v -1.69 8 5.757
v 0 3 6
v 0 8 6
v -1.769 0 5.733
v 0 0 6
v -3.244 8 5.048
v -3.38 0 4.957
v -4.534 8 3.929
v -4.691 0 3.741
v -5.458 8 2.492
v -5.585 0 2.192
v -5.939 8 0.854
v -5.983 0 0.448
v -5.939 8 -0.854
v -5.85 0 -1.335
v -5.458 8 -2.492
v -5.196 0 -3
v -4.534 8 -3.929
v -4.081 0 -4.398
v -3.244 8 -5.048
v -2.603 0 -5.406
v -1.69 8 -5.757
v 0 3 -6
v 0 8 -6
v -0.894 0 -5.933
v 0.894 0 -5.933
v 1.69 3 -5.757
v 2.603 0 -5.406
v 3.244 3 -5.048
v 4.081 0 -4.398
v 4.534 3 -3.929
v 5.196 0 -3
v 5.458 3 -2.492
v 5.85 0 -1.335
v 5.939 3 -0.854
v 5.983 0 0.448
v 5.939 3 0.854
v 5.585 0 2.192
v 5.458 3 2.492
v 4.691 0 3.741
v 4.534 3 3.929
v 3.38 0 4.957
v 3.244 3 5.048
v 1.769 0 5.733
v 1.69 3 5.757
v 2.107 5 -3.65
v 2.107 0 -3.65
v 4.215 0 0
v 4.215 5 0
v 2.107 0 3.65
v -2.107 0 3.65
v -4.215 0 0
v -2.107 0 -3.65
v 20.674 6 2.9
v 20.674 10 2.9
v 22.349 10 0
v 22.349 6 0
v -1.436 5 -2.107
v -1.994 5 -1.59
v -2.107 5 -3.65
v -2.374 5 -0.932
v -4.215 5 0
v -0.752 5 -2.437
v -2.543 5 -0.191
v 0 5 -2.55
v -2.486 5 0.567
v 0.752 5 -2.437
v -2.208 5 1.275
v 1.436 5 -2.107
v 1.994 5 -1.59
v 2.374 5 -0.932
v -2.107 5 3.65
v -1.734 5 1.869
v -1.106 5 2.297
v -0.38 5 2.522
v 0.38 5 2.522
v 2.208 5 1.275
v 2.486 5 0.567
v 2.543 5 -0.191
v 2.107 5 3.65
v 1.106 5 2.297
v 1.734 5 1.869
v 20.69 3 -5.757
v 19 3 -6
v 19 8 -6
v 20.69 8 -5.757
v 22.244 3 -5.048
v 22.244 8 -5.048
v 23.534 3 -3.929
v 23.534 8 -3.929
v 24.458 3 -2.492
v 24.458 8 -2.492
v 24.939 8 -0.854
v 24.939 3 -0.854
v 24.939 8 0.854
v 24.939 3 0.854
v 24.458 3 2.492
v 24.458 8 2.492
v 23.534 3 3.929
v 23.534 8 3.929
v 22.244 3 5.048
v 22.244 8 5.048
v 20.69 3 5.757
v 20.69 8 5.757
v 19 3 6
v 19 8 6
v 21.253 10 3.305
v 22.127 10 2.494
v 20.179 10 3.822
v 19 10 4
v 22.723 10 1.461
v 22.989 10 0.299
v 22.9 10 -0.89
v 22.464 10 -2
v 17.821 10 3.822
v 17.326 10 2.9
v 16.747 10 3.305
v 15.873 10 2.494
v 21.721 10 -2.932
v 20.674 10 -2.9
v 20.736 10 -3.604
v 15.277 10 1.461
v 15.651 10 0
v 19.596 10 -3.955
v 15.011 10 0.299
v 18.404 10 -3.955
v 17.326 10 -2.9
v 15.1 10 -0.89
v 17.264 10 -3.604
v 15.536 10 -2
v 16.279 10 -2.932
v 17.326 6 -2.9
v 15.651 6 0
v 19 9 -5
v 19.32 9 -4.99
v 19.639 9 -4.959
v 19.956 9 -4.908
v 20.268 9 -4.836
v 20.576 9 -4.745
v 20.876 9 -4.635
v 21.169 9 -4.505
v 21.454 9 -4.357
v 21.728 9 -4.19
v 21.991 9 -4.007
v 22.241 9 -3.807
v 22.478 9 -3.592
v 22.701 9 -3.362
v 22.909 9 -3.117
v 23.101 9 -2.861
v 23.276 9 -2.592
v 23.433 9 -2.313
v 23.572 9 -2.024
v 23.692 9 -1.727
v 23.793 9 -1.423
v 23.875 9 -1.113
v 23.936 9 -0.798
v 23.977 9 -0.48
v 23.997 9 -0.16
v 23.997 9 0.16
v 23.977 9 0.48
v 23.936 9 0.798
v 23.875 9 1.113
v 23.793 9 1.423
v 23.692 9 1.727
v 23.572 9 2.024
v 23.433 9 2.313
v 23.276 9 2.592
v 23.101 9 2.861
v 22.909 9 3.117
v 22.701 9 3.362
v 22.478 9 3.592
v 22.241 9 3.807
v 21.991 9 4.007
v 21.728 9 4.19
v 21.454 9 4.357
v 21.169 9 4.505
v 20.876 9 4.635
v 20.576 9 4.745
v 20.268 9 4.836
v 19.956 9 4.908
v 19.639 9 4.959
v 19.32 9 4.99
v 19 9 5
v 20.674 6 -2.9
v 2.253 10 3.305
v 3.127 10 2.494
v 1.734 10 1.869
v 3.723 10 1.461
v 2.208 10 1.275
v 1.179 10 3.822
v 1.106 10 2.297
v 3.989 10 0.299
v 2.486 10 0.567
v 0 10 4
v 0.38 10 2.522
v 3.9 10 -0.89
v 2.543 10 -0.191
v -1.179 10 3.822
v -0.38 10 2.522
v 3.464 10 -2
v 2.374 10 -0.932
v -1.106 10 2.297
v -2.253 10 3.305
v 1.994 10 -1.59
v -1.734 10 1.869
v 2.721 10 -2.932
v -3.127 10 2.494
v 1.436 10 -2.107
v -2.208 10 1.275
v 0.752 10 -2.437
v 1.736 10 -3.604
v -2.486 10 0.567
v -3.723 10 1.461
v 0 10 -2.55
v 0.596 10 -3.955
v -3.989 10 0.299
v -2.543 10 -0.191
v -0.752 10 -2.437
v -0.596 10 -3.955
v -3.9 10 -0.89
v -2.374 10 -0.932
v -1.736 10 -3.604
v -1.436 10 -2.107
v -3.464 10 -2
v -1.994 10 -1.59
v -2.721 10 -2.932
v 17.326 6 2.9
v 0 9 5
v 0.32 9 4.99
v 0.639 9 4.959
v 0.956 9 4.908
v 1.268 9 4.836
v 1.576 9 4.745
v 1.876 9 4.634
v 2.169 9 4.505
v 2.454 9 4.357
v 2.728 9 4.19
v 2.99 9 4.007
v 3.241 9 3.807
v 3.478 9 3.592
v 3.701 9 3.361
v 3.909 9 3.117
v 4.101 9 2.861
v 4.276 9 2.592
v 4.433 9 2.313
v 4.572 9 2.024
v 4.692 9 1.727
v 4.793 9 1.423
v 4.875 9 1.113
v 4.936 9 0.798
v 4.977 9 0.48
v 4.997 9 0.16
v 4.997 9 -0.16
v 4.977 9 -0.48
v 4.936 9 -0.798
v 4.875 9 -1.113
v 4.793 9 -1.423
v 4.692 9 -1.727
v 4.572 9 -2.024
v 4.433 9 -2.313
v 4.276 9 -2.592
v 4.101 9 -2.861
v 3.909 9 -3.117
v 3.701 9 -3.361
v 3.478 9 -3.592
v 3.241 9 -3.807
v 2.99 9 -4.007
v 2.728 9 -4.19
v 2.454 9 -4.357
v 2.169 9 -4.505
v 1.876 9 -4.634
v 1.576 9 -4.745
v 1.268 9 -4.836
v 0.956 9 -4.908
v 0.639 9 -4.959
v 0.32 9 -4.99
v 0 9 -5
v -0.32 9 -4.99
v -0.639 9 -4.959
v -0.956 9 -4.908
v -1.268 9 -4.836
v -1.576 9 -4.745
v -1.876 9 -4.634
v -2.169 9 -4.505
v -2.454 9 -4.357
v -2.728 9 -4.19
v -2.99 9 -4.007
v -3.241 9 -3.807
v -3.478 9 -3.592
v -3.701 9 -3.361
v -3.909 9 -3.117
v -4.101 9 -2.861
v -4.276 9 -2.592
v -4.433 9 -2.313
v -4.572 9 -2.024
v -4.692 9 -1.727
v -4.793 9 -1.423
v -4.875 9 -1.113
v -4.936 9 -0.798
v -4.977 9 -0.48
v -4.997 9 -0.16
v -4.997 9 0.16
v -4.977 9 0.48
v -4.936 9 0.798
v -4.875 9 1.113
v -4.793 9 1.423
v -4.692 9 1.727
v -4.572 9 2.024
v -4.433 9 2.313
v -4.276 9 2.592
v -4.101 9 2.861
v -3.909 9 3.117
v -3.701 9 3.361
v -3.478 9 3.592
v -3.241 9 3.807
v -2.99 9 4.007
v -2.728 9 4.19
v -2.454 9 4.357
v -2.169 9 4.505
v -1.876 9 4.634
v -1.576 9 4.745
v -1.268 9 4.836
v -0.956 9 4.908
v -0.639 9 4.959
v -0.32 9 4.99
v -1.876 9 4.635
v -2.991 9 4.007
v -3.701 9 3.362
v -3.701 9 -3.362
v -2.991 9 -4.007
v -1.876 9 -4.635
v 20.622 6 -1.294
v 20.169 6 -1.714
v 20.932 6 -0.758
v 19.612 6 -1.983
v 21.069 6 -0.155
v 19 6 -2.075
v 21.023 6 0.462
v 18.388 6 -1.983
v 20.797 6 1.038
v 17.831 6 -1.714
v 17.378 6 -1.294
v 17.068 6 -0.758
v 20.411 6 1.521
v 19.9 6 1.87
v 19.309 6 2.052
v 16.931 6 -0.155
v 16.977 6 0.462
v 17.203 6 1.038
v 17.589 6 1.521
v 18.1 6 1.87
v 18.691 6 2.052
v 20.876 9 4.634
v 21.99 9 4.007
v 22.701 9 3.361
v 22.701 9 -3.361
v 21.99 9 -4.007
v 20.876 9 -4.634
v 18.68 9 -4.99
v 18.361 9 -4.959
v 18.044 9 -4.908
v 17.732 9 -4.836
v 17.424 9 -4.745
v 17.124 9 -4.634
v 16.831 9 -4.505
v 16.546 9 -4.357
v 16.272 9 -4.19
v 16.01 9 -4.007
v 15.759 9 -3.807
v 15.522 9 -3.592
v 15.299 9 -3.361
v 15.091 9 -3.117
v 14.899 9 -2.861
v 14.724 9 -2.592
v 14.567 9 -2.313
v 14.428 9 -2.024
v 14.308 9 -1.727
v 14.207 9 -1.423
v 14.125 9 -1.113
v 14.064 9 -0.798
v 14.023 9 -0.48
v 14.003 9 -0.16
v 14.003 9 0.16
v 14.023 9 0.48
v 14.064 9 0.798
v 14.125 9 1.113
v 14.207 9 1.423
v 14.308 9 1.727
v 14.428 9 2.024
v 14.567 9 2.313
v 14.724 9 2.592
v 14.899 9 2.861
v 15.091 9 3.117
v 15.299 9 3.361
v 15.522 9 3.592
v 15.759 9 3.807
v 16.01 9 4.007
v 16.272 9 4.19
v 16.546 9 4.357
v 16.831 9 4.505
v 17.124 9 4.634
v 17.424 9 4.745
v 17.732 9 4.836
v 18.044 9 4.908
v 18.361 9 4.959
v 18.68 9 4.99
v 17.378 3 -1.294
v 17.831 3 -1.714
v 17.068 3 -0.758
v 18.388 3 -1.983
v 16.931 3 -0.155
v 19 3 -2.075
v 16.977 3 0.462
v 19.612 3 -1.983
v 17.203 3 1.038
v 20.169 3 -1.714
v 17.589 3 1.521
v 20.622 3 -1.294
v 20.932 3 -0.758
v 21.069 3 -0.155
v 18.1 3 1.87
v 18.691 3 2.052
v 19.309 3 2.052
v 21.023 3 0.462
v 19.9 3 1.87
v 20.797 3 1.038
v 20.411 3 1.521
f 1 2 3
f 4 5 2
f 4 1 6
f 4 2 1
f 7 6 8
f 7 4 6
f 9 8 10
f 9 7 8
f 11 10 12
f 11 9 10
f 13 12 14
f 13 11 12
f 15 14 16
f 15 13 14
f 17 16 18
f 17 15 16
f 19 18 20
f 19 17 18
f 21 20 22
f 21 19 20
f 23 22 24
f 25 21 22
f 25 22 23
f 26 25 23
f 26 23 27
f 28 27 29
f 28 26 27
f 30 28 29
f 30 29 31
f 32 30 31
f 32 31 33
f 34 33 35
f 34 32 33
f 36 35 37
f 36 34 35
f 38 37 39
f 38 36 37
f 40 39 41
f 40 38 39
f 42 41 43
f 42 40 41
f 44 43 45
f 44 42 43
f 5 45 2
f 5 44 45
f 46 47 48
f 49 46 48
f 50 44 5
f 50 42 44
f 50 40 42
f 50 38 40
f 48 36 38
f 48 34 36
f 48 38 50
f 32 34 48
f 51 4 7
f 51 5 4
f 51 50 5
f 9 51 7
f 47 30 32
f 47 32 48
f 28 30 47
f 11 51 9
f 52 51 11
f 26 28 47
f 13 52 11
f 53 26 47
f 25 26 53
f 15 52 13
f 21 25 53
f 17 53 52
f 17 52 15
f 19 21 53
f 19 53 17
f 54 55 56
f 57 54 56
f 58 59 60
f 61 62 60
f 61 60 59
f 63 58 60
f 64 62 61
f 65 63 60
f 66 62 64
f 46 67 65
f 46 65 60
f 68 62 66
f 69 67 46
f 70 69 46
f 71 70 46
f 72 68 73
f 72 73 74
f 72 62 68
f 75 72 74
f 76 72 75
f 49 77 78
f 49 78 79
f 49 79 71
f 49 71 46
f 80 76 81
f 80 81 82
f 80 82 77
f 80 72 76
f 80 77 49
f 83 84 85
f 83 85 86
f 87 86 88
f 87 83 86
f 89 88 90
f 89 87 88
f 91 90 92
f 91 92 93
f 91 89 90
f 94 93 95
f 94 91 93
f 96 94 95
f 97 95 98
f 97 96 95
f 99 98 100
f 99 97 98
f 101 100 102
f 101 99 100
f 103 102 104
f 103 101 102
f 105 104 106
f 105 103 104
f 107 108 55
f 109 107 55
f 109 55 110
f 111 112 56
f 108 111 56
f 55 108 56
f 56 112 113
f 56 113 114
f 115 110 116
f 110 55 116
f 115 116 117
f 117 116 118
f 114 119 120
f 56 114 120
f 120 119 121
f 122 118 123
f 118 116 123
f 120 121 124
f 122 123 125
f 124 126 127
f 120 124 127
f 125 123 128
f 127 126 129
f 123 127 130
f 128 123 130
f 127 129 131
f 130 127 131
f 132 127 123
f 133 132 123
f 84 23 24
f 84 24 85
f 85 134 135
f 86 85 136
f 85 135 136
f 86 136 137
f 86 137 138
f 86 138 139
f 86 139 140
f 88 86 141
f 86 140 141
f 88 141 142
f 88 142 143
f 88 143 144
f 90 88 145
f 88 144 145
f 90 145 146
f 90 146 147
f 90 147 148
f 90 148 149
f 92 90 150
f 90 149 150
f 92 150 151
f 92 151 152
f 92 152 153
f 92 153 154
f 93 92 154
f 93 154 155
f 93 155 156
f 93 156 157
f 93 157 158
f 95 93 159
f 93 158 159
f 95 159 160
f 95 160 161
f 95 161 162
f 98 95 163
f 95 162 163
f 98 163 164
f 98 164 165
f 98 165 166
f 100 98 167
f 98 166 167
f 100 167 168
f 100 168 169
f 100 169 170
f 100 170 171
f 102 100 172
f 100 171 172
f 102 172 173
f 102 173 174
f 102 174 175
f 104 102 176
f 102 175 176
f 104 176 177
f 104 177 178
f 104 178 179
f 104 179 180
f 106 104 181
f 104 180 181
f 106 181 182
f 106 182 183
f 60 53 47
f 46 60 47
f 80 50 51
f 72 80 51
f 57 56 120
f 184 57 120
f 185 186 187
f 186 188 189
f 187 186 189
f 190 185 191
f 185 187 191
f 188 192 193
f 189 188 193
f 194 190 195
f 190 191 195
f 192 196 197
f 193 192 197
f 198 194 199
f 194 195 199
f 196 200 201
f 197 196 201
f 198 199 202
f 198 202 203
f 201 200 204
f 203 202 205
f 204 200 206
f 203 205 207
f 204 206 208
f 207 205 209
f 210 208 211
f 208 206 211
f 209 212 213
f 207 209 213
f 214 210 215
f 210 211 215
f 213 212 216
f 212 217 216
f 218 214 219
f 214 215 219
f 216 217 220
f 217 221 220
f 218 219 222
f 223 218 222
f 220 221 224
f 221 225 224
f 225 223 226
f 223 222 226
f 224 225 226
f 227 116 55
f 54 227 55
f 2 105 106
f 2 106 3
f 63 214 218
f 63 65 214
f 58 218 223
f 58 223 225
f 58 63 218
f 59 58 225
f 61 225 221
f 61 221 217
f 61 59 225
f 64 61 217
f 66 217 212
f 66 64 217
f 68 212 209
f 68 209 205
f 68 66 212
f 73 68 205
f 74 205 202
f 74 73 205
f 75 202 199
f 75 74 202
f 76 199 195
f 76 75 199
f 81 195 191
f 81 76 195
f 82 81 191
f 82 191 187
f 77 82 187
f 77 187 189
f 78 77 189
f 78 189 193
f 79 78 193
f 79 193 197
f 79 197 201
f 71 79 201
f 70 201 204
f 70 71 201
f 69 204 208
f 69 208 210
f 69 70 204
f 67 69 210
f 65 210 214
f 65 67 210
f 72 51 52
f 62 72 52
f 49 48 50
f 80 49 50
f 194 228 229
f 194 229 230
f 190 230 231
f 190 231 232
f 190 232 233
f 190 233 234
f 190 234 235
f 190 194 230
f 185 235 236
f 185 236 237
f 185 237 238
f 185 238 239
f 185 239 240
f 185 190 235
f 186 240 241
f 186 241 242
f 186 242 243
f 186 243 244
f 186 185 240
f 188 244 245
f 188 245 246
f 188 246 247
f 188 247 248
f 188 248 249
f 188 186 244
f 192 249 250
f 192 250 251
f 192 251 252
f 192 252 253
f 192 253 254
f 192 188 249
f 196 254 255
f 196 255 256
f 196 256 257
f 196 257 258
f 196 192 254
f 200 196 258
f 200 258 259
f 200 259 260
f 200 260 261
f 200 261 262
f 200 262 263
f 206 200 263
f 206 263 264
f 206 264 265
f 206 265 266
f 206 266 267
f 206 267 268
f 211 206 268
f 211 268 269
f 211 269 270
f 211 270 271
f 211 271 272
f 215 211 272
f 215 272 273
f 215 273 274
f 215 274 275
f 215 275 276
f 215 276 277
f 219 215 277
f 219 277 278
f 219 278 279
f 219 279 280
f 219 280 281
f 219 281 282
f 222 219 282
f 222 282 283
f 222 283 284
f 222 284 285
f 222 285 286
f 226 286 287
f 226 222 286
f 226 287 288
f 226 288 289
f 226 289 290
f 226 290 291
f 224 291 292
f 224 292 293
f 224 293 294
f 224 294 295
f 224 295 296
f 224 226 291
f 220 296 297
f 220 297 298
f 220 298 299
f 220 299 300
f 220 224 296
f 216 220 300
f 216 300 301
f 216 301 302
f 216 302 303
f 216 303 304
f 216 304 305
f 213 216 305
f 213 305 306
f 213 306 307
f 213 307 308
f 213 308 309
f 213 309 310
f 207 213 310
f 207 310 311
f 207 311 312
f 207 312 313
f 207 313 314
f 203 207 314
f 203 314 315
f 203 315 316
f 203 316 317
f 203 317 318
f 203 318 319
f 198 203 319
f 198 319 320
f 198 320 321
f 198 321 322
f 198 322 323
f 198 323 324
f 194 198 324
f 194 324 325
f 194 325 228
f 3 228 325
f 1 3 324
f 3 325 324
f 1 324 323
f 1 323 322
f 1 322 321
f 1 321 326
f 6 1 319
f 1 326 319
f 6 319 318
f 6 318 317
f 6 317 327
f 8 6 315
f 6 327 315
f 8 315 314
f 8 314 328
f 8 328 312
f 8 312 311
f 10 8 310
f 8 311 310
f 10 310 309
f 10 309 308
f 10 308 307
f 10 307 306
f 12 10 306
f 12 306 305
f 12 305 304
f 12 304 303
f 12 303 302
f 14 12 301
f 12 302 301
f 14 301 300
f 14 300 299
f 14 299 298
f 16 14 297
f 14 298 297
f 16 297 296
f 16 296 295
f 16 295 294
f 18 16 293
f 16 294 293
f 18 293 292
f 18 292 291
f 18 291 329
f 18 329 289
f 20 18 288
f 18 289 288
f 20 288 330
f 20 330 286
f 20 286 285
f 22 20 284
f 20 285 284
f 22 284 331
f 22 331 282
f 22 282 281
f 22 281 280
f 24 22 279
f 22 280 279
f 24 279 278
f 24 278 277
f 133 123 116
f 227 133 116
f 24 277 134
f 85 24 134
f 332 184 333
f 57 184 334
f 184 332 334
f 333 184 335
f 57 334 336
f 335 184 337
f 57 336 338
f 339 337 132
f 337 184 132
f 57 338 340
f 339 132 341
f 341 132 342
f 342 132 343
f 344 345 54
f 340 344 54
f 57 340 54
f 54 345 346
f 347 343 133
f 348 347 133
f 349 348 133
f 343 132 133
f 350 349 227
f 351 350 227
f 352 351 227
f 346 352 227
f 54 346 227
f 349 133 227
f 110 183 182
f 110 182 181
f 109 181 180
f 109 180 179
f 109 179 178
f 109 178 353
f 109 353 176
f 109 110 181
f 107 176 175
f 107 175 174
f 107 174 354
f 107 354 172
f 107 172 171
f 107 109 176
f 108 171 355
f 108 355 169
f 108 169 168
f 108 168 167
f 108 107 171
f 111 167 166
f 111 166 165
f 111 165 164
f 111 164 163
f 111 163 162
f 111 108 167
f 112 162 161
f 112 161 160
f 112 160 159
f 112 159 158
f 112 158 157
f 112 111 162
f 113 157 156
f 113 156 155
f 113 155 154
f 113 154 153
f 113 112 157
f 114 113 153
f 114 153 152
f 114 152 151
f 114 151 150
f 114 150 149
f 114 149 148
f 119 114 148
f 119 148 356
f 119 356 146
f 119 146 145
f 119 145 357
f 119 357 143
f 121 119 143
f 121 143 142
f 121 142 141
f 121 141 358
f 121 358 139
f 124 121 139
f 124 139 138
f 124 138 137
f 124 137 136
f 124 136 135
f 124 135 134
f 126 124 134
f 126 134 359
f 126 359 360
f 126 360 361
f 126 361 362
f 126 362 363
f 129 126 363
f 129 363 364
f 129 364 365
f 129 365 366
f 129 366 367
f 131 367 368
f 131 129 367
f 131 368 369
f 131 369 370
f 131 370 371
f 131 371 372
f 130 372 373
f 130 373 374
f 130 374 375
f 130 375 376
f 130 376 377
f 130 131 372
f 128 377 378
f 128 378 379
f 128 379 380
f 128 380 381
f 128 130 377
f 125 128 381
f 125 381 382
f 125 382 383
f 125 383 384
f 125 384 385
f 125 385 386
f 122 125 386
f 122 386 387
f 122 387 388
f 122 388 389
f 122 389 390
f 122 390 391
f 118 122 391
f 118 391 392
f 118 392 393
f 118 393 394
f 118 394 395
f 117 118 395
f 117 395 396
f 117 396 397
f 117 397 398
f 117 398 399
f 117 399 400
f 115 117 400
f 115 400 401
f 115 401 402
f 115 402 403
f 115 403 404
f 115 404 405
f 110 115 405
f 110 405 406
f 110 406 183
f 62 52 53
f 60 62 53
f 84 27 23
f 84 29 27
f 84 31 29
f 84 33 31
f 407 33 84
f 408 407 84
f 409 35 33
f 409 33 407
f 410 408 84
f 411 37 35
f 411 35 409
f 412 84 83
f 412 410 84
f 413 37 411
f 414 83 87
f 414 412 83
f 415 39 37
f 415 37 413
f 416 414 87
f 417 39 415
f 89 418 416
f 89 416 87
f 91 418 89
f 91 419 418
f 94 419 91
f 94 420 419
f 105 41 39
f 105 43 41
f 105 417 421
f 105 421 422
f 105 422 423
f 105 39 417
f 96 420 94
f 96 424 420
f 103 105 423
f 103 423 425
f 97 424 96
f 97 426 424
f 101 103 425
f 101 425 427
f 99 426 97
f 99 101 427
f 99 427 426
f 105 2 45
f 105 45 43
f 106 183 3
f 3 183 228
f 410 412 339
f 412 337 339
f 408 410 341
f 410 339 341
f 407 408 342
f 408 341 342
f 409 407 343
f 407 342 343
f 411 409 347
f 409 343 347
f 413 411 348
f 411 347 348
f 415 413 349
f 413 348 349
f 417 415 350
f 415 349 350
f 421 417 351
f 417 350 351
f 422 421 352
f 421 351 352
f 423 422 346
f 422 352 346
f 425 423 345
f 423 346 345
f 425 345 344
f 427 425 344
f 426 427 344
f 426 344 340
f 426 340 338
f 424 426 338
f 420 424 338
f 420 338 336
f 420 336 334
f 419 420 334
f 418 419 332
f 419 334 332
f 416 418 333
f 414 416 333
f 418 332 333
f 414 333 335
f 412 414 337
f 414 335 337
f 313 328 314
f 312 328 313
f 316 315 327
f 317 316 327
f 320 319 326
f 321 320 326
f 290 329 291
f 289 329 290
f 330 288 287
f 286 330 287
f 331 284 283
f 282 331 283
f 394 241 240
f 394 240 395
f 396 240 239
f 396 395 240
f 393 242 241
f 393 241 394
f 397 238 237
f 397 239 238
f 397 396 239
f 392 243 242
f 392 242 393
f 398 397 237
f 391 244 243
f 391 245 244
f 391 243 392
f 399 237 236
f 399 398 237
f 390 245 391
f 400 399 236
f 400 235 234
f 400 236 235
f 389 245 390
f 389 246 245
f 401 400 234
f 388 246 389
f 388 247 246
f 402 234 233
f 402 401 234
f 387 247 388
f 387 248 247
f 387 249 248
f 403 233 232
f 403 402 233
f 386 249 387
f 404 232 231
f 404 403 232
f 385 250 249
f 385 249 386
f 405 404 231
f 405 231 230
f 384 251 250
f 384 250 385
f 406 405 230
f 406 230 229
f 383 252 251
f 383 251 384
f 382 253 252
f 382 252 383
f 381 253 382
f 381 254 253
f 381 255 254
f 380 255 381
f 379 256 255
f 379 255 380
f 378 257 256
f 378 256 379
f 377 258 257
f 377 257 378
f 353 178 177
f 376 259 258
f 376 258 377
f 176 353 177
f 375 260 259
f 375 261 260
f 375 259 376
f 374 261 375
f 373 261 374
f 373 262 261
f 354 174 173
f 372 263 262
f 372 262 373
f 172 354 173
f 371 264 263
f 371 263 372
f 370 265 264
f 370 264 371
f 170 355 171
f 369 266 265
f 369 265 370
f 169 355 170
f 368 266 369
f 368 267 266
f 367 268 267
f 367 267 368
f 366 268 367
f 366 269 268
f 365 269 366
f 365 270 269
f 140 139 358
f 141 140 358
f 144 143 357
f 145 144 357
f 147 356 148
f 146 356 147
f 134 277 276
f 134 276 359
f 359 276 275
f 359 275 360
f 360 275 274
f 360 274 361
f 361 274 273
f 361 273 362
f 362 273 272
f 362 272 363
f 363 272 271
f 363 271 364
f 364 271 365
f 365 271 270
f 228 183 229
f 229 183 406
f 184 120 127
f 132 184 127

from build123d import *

# Parameters (mm, degrees)
EXTRUDE_1_DEPTH     = 10
CHAMFER_1_SIZE      = 2
CUT_EXTRUDE_1_DEPTH = 5
SKETCH_5_R          = 32.43595028
SKETCH_5_R_2        = 6
CUT_EXTRUDE_2_DEPTH = 3
CUT_EXTRUDE_3_DEPTH = 4
SKETCH_7_W          = 54.061660739
SKETCH_7_H          = 47.527586942
SKETCH_7_R          = 4
CUT_EXTRUDE_4_DEPTH = 1
CHAMFER_2_SIZE      = 1


with BuildPart() as part:
    # 草图1 → 凸台-拉伸1 (new body)
    with BuildSketch(Plane(origin=(0, 0, 0), x_dir=(1, 0, 0), z_dir=(0, 1, 0))):
        with BuildLine():
            Line((0, 6), (19, 6))
            ThreePointArc((19, 6), (25, 0), (19, -6))
            Line((19, -6), (0, -6))
            ThreePointArc((0, -6), (-6, 0), (0, 6))
        make_face()
    extrude(amount=EXTRUDE_1_DEPTH)

    # 草图2 → 切除-旋转1 (revolve, cut)
    with BuildSketch(Plane.XY, mode=Mode.PRIVATE) as cut_revolve_1_sk:
        Polygon((0, 10), (-2.55, 10), (-2.55, 5), (-1.6, 5), (-1.6, 2), (-2.55, 2), (-2.55, 0), (0, 0), align=None)
    revolve(cut_revolve_1_sk.sketch.rotate(Axis((0, -1.427566958, 0), (0, 1, 0)), 270), axis=Axis((0, -1.427566958, 0), (0, 1, 0)), mode=Mode.SUBTRACT)

    # 草图3 → 切除-旋转2 (revolve, cut)
    with BuildSketch(Plane.XY, mode=Mode.PRIVATE) as cut_revolve_2_sk:
        Polygon((19, 0), (16.925, 0), (16.925, 6), (16.5, 6), (16.5, 10), (19, 10), align=None)
    revolve(cut_revolve_2_sk.sketch.rotate(Axis((19, 0, 0), (0, 1, 0)), 270), axis=Axis((19, 0, 0), (0, 1, 0)), mode=Mode.SUBTRACT)

    # 倒角1
    chamfer_1_edges = [part.edges().sort_by_distance(p)[0] for p in [
        (25, 10, 0),
        (9.5, 10, -6),
        (-6, 10, 0),
        (9.5, 10, 6),
    ]]
    chamfer(chamfer_1_edges, length=CHAMFER_1_SIZE)

    # 草图4 → 切除-拉伸1 (cut)
    with BuildSketch(Plane.XZ):
        Polygon((2.107328483, 3.65), (-2.107328483, 3.65), (-4.214656965, 0), (-2.107328483, -3.65), (2.107328483, -3.65), (4.214656965, 0), align=None)
    extrude(amount=-CUT_EXTRUDE_1_DEPTH, mode=Mode.SUBTRACT)

    # 草图5 → 切除-拉伸2 (cut)
    with BuildSketch(Plane.XZ):
        Circle(SKETCH_5_R)
        with Locations(Location((0, 0, 0), (0, 0, 90))):
            Circle(SKETCH_5_R_2, mode=Mode.SUBTRACT)
    extrude(amount=-CUT_EXTRUDE_2_DEPTH, mode=Mode.SUBTRACT)

    # 草图6 → 切除-拉伸3 (cut)
    with BuildSketch(Plane(origin=(0, 10, 0), x_dir=(1, 0, 0), z_dir=(0, 1, 0))):
        Polygon((20.674315781, 2.9), (17.325684219, 2.9), (15.651368439, 0), (17.325684219, -2.9), (20.674315781, -2.9), (22.348631561, 0), align=None)
    extrude(amount=-CUT_EXTRUDE_3_DEPTH, mode=Mode.SUBTRACT)

    # 草图7 → 切除-拉伸4 (cut)
    with BuildSketch(Plane(origin=(0, 10, 0), x_dir=(1, 0, 0), z_dir=(0, 1, 0))):
        with Locations((6.682015694, 1.141108586)):
            Rectangle(SKETCH_7_W, SKETCH_7_H)
        with Locations(Location((0, 0, 0), (0, 0, 270))):
            Circle(SKETCH_7_R, mode=Mode.SUBTRACT)
        with Locations(Location((19, 0, 0), (0, 0, 270))):
            Circle(SKETCH_7_R, mode=Mode.SUBTRACT)
    extrude(amount=-CUT_EXTRUDE_4_DEPTH, mode=Mode.SUBTRACT)

    # 倒角2
    chamfer_2_edges = [part.edges().sort_by_distance(p)[0] for p in [
        (19, 9, -4),
        (0, 9, -4),
    ]]
    chamfer(chamfer_2_edges, length=CHAMFER_2_SIZE - 0.0001)  # a hair under: the kernel refuses the full size


solid = part.part
